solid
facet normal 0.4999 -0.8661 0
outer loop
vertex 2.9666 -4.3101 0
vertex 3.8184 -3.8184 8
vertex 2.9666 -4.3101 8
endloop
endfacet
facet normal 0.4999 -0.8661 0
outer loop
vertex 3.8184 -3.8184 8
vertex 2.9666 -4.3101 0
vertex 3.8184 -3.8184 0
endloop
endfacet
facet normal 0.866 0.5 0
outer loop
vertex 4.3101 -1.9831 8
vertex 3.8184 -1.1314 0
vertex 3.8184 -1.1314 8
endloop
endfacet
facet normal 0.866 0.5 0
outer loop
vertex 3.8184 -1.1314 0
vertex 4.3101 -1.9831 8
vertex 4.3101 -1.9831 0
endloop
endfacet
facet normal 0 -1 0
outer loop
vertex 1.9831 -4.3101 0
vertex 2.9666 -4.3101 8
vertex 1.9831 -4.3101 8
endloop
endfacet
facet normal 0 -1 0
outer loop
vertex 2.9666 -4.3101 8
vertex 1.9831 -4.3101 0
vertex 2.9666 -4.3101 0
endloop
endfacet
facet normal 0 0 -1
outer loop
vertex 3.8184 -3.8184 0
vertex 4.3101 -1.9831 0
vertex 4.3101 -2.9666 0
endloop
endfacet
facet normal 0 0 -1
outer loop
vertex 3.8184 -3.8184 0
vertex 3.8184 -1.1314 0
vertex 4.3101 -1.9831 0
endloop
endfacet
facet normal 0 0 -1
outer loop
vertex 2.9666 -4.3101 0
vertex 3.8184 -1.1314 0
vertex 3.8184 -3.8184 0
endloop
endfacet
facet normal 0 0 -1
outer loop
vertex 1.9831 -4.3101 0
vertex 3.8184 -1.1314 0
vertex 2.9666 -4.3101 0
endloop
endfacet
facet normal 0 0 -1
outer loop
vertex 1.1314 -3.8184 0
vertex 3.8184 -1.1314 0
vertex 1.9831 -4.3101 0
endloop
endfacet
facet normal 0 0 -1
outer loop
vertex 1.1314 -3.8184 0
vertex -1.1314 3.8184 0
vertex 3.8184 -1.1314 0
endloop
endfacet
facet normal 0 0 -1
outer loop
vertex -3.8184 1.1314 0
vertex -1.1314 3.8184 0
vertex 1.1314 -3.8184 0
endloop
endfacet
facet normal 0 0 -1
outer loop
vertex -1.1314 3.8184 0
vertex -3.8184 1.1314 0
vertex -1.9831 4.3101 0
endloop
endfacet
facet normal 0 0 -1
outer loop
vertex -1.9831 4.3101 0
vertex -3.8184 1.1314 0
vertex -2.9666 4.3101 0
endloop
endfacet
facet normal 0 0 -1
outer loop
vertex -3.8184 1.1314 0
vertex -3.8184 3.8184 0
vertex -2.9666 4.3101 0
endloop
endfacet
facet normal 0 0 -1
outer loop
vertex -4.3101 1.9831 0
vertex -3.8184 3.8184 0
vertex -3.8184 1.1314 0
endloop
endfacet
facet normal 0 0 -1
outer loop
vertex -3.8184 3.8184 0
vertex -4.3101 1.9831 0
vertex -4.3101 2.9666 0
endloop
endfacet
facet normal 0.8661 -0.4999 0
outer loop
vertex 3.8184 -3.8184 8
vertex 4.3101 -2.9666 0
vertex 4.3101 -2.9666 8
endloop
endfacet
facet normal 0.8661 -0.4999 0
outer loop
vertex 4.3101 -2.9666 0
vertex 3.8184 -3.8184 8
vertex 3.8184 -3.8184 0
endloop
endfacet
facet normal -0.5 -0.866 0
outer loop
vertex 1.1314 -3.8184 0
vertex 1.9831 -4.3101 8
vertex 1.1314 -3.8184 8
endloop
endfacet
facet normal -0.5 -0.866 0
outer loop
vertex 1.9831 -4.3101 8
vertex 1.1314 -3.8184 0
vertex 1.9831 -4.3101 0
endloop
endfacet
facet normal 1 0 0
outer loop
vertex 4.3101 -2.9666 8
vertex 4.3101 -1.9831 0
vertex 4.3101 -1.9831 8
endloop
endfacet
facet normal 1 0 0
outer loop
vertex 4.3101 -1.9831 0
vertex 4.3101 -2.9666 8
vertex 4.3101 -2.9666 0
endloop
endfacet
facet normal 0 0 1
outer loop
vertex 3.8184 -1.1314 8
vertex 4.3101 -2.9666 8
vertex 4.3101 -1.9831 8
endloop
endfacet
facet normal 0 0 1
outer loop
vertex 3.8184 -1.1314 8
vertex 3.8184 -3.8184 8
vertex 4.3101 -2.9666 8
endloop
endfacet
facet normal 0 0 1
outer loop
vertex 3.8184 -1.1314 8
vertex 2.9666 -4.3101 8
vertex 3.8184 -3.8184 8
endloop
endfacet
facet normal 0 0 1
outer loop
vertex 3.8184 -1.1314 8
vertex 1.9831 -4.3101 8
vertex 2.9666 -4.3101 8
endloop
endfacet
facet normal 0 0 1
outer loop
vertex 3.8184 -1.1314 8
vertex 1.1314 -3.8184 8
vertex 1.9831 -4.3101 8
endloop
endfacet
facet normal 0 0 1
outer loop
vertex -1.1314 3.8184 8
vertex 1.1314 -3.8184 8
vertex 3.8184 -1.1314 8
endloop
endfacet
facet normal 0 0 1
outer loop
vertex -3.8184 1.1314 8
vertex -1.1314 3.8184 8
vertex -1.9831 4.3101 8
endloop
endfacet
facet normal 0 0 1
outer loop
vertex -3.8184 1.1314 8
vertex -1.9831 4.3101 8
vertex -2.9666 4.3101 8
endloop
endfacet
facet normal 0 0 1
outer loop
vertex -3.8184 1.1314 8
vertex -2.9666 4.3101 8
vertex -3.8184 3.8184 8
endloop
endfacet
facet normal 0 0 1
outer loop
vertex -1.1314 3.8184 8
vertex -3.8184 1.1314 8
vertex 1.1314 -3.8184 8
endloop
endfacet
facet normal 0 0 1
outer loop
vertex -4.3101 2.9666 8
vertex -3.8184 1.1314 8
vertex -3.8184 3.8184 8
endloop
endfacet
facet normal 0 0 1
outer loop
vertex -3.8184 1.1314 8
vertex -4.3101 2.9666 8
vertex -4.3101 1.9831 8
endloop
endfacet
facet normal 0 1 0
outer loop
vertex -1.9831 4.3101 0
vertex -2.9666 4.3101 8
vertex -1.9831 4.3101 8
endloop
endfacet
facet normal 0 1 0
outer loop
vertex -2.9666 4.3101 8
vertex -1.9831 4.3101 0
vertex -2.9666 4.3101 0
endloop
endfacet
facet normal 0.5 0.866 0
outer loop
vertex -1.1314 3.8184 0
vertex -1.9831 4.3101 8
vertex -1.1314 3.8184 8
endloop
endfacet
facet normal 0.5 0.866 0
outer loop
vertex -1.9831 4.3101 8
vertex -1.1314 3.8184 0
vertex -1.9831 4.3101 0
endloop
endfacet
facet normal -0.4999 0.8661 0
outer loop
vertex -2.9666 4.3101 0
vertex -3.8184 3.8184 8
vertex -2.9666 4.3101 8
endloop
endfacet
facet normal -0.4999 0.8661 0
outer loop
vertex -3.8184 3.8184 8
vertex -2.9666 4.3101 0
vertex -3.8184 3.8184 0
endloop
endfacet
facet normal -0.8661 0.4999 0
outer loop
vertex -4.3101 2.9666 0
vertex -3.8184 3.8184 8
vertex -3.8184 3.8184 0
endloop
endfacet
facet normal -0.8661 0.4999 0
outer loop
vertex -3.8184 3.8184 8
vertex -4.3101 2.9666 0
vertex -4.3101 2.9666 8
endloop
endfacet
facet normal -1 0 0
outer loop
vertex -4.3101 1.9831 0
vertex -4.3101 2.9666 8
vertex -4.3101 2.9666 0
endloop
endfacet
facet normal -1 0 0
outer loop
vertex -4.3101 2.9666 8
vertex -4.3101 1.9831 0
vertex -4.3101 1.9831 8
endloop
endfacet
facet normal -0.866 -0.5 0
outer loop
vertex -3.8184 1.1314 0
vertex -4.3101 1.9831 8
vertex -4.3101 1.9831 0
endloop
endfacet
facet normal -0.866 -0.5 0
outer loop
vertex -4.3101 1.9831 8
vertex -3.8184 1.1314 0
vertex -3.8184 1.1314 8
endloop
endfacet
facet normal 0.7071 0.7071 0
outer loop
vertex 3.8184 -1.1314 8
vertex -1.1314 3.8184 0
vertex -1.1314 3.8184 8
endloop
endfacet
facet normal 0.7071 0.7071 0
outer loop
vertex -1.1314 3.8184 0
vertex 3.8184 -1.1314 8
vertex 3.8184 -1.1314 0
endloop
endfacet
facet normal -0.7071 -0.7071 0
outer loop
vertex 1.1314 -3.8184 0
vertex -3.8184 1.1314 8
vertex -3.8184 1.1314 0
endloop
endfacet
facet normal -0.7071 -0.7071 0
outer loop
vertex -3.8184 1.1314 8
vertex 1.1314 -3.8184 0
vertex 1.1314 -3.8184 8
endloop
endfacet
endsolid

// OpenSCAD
boltSlot();

module boltSlot(angle = 45,dia = 3.8, height= 8,len = 7)
{
rotate([0,0,angle])
translate([0,0,height/2]) 
union()
	{
	translate([0,-len/2,0])
		cylinder(d=dia,h=height,center=true,$fn=12);
	translate([0,len/2,0])
		cylinder(d=dia,h=height,center=true,$fn=12);
	cube([dia,len,height],true);
	}
}
